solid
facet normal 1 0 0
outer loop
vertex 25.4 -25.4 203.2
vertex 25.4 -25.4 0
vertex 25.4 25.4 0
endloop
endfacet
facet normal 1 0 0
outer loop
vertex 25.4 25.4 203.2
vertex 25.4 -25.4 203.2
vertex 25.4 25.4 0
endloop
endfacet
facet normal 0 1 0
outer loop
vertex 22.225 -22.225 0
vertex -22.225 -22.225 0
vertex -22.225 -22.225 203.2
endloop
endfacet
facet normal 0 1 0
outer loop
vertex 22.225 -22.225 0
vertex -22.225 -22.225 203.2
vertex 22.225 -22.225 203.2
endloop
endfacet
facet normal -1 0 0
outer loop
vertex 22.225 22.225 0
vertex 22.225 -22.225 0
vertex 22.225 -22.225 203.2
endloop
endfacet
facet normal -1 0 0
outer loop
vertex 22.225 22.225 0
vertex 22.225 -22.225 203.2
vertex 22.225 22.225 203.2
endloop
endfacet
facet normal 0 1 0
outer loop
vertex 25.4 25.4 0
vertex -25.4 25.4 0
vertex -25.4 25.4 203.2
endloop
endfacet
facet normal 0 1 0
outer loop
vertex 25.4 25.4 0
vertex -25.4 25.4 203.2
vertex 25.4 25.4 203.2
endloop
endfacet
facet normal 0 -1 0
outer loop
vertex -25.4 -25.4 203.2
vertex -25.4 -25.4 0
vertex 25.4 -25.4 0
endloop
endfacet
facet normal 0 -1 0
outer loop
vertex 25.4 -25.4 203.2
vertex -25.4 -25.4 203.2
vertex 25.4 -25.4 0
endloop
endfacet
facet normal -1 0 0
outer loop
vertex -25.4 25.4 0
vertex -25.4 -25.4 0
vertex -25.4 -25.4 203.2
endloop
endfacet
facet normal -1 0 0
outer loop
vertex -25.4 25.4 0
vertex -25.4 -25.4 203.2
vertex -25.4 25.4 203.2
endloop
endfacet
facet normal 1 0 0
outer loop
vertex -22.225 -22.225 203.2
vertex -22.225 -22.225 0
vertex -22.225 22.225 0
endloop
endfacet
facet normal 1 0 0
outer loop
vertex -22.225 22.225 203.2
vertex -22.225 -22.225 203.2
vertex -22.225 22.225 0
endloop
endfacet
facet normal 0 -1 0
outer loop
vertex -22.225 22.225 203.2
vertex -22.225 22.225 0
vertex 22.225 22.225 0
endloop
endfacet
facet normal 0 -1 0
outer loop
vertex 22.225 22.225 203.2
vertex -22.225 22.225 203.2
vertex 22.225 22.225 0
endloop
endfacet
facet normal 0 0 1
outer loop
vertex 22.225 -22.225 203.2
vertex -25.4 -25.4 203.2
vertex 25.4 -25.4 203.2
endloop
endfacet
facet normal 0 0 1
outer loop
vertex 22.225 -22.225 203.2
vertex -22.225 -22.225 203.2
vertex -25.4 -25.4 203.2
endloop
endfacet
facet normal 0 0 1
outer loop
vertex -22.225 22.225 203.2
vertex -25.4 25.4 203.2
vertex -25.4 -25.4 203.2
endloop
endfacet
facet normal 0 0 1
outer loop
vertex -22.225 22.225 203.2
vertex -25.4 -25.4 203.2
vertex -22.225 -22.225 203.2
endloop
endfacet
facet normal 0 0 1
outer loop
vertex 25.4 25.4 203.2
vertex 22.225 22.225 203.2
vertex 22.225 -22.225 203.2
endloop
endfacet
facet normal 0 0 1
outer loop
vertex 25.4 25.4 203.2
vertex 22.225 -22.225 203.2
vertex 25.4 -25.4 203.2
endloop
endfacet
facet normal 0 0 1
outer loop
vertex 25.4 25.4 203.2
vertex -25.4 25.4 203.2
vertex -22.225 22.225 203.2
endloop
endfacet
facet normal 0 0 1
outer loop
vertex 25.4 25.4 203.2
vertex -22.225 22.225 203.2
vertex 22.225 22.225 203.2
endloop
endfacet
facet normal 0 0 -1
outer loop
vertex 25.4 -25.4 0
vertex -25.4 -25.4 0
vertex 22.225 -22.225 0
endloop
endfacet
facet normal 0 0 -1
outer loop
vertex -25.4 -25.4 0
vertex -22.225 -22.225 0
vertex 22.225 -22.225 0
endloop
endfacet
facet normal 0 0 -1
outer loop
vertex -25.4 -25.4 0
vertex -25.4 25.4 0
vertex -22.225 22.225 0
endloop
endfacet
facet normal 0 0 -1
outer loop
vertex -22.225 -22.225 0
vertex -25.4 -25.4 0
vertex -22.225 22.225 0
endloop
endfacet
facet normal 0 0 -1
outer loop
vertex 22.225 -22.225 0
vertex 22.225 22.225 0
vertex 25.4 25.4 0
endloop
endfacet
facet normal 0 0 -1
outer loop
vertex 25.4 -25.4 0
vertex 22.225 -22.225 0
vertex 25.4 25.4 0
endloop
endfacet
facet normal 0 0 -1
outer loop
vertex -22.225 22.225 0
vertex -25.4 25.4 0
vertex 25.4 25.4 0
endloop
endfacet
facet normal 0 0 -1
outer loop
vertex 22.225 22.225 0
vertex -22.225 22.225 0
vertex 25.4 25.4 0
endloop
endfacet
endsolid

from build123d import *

# Parameters (mm, degrees)
F0_W     = 50.8
F0_H     = 50.8
F2_DEPTH = 203.2
F1_W     = 44.45
F1_H     = 44.45
F3_DEPTH = 203.2


with BuildPart() as f2:
    # F0 (on Top) → F2 (new body)
    with BuildSketch(Plane.XY):
        Rectangle(F0_W, F0_H)
    extrude(amount=F2_DEPTH)

    # F1 (on Top) → F3 (cut)
    with BuildSketch(Plane.XY):
        Rectangle(F1_W, F1_H)
    extrude(amount=F3_DEPTH, mode=Mode.SUBTRACT)


solid = f2.part
